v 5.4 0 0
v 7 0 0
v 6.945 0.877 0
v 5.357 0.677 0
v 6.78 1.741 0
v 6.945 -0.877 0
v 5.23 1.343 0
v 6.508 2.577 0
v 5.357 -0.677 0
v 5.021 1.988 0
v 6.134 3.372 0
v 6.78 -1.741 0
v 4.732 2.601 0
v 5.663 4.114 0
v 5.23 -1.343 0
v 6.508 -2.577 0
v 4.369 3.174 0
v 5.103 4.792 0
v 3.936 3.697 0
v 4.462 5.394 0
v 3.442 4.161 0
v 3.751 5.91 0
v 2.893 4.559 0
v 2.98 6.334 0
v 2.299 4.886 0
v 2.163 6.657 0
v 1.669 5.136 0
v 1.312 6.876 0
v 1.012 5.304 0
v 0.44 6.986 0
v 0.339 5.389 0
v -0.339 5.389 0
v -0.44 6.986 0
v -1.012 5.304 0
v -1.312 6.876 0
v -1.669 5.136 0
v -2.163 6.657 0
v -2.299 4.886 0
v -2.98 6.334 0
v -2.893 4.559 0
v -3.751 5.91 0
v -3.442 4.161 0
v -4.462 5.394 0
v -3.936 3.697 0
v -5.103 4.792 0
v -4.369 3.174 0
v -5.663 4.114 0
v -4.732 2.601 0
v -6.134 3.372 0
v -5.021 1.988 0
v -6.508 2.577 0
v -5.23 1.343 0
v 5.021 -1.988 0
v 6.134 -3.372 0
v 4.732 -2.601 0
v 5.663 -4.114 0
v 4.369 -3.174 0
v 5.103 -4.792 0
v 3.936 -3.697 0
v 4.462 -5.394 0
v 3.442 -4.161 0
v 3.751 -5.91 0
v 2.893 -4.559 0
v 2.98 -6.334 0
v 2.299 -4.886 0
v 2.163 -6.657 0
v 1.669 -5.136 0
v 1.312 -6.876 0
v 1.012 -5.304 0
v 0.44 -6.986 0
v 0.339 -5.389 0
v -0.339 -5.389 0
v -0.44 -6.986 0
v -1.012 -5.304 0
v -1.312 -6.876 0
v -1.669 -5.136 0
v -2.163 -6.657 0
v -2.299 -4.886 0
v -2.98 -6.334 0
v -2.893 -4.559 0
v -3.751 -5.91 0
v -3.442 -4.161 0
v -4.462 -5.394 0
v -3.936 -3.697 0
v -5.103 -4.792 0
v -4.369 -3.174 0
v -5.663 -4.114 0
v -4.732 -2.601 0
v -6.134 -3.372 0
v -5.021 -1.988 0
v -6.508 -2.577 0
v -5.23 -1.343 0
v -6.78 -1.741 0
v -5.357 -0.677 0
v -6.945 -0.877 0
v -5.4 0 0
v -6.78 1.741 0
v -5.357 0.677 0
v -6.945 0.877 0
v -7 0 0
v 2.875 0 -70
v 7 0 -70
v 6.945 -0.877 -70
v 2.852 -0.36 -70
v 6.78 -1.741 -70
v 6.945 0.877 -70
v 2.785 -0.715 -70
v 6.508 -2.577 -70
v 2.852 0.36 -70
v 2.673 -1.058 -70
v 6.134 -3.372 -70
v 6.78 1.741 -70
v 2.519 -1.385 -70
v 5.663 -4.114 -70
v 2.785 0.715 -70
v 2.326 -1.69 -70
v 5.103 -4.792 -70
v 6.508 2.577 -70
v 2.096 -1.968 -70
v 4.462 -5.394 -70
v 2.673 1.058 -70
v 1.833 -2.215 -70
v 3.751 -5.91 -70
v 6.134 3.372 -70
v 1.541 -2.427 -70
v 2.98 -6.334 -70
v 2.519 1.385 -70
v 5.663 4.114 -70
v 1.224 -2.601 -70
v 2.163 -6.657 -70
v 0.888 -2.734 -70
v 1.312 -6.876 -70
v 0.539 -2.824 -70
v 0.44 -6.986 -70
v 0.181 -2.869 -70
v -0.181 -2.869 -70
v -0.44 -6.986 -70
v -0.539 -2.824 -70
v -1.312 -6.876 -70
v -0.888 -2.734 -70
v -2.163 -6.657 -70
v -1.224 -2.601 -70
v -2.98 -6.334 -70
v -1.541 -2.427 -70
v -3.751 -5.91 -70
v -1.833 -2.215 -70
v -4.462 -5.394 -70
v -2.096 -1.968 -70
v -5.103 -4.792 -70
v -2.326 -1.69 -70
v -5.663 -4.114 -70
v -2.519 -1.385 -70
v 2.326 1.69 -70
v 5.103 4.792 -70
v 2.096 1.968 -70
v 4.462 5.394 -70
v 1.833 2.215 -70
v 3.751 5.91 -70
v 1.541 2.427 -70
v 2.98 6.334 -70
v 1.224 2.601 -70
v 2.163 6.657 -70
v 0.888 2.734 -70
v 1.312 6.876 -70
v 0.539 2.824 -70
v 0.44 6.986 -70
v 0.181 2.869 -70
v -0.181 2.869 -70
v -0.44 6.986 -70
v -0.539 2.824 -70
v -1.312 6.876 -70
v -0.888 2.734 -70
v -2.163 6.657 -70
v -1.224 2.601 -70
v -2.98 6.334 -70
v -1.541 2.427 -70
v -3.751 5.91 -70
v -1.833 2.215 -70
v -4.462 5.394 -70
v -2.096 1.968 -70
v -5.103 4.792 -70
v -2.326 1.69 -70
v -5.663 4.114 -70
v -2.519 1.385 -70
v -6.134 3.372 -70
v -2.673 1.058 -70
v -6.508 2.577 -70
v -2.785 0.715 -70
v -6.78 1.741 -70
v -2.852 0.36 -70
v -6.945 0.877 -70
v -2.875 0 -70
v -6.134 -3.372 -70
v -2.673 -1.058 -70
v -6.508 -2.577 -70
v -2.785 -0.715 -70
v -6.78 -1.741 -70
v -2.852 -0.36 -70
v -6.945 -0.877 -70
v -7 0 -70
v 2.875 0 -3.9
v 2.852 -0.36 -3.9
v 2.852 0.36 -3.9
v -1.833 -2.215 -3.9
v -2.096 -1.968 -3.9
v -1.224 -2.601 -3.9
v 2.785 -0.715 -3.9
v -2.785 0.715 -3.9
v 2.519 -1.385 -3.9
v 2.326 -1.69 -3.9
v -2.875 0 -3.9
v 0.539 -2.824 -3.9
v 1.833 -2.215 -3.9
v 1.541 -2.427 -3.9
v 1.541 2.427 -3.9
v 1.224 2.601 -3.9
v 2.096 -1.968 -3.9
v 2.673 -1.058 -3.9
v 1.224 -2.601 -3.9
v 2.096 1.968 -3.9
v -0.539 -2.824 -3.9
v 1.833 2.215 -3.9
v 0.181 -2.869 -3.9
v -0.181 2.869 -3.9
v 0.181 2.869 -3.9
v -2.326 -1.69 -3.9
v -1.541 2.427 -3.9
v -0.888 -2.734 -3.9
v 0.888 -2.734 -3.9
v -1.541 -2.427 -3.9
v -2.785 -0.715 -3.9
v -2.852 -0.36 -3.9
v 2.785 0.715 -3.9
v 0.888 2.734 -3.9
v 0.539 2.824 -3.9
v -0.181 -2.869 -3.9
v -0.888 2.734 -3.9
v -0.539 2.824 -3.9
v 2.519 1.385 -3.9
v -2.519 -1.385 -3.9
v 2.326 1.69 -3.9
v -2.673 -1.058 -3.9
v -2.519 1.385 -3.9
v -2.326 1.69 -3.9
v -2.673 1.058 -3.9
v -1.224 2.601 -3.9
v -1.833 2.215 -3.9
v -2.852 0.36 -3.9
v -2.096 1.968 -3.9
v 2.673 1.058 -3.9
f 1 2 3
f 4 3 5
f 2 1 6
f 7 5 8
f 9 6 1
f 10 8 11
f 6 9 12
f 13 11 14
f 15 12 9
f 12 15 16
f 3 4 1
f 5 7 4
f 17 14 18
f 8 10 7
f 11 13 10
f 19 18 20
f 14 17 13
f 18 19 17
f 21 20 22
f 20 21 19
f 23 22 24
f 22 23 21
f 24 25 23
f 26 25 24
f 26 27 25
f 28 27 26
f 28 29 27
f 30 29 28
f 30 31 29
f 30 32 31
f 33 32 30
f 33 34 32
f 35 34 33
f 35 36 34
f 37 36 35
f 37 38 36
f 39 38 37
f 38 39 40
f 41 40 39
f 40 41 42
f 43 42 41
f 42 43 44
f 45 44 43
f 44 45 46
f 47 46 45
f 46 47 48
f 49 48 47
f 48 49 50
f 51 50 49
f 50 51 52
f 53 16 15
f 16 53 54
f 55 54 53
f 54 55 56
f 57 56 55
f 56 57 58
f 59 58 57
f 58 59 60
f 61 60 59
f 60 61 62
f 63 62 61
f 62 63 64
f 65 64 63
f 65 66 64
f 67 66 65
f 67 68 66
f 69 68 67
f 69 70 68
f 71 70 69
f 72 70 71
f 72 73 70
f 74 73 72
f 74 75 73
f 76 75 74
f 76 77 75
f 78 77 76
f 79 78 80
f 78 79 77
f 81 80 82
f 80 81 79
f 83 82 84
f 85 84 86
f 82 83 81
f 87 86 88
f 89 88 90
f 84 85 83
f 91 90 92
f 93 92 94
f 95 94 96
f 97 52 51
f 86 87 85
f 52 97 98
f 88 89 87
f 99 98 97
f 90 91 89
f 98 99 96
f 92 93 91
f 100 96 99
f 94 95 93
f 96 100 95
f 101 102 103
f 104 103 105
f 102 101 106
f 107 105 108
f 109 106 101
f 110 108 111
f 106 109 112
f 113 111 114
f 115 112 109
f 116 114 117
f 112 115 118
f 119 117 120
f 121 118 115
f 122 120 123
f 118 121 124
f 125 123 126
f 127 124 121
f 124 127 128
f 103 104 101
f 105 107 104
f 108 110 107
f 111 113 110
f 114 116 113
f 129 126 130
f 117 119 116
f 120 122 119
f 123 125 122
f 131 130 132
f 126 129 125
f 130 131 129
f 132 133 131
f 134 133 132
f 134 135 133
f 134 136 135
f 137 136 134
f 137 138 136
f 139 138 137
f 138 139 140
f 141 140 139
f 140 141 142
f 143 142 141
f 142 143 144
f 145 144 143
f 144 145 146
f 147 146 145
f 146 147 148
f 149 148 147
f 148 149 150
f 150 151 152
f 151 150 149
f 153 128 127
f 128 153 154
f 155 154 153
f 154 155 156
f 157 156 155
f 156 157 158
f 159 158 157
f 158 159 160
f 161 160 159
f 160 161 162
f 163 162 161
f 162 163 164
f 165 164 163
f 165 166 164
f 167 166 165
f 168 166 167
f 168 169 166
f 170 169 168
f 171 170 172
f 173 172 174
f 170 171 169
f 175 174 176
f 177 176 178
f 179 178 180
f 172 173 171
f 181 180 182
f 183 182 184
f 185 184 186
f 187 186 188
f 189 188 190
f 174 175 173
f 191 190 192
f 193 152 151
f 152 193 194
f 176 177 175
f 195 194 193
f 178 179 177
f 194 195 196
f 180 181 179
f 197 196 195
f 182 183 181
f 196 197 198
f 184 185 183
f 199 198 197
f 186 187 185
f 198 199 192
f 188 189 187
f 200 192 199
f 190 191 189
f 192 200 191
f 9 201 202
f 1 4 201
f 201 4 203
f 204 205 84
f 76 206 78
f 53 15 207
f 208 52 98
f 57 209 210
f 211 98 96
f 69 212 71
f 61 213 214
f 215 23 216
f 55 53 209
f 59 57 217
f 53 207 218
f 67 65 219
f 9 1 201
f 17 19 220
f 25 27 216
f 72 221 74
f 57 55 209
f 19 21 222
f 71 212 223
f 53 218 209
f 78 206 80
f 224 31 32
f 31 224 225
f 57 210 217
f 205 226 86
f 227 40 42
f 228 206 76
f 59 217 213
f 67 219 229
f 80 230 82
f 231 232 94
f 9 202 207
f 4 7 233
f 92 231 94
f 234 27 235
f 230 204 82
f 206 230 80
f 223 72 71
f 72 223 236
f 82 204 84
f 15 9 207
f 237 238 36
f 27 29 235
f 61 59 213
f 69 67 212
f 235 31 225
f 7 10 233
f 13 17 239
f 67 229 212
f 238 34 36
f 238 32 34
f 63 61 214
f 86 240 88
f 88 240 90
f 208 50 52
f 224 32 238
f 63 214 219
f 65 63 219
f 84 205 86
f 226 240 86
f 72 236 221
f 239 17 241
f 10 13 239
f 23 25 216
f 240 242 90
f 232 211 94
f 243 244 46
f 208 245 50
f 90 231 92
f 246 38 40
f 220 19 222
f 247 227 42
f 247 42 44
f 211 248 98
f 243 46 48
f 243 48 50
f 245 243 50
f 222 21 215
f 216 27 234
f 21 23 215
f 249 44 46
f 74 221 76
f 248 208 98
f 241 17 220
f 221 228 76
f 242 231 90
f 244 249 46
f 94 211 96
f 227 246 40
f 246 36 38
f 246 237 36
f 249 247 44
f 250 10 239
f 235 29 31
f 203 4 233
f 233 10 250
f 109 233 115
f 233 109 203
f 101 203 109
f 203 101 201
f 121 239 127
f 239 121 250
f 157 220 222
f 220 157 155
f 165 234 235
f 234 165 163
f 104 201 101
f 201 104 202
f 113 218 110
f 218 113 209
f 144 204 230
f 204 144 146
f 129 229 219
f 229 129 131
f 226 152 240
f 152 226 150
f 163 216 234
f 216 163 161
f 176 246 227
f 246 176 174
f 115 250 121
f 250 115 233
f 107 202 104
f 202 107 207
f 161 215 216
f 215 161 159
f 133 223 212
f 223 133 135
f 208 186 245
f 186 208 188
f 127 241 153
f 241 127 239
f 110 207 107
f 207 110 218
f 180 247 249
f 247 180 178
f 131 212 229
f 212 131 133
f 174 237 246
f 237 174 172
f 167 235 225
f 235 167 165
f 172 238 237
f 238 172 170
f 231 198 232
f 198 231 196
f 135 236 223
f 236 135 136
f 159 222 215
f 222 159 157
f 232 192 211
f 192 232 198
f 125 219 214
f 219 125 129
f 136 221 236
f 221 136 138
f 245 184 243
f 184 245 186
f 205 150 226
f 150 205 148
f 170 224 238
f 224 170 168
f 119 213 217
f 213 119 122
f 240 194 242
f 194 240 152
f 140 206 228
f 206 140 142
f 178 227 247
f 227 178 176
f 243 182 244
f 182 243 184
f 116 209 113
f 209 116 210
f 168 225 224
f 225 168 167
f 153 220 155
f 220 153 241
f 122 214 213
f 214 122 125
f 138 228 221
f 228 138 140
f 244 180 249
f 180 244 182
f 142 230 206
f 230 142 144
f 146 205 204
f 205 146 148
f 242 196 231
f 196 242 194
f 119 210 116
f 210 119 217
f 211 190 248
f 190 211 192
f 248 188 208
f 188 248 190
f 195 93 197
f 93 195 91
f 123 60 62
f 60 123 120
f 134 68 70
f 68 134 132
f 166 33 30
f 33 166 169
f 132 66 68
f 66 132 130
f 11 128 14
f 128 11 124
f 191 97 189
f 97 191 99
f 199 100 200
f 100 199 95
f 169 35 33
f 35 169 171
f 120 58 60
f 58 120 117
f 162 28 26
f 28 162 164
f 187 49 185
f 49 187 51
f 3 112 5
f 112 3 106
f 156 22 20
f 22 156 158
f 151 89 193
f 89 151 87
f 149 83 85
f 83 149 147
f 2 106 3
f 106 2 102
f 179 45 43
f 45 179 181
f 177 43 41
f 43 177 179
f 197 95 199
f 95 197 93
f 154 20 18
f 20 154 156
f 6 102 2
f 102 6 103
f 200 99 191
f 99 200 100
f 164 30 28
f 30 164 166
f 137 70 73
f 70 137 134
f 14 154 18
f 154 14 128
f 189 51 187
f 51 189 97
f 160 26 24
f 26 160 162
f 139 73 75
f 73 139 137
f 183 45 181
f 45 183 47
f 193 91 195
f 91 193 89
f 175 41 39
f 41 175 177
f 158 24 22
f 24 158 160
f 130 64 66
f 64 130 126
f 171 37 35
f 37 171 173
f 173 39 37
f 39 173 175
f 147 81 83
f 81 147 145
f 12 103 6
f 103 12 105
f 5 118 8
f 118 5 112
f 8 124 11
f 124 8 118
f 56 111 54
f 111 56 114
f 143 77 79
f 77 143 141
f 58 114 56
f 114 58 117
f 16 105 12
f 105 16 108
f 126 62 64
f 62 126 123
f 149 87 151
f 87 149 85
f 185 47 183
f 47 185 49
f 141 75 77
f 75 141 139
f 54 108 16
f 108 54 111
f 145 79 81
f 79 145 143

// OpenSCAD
$fn = 50;


difference() {
	union() {
		translate(v = [0, 0, -70.0000000000]) {
			cylinder(h = 70, r = 7.0000000000);
		}
	}
	union() {
		translate(v = [0, 0, 0]) {
			rotate(a = [0, 0, 0]) {
				difference() {
					union() {
						#translate(v = [0, 0, -70.0000000000]) {
							cylinder(h = 70, r = 2.6000000000);
						}
						#translate(v = [0, 0, -3.9000000000]) {
							cylinder(h = 3.9000000000, r1 = 2.8750000000, r2 = 5.4000000000);
						}
						#translate(v = [0, 0, -70.0000000000]) {
							cylinder(h = 70, r = 2.8750000000);
						}
						#translate(v = [0, 0, -70.0000000000]) {
							cylinder(h = 70, r = 2.6000000000);
						}
					}
					union();
				}
			}
		}
	}
}
